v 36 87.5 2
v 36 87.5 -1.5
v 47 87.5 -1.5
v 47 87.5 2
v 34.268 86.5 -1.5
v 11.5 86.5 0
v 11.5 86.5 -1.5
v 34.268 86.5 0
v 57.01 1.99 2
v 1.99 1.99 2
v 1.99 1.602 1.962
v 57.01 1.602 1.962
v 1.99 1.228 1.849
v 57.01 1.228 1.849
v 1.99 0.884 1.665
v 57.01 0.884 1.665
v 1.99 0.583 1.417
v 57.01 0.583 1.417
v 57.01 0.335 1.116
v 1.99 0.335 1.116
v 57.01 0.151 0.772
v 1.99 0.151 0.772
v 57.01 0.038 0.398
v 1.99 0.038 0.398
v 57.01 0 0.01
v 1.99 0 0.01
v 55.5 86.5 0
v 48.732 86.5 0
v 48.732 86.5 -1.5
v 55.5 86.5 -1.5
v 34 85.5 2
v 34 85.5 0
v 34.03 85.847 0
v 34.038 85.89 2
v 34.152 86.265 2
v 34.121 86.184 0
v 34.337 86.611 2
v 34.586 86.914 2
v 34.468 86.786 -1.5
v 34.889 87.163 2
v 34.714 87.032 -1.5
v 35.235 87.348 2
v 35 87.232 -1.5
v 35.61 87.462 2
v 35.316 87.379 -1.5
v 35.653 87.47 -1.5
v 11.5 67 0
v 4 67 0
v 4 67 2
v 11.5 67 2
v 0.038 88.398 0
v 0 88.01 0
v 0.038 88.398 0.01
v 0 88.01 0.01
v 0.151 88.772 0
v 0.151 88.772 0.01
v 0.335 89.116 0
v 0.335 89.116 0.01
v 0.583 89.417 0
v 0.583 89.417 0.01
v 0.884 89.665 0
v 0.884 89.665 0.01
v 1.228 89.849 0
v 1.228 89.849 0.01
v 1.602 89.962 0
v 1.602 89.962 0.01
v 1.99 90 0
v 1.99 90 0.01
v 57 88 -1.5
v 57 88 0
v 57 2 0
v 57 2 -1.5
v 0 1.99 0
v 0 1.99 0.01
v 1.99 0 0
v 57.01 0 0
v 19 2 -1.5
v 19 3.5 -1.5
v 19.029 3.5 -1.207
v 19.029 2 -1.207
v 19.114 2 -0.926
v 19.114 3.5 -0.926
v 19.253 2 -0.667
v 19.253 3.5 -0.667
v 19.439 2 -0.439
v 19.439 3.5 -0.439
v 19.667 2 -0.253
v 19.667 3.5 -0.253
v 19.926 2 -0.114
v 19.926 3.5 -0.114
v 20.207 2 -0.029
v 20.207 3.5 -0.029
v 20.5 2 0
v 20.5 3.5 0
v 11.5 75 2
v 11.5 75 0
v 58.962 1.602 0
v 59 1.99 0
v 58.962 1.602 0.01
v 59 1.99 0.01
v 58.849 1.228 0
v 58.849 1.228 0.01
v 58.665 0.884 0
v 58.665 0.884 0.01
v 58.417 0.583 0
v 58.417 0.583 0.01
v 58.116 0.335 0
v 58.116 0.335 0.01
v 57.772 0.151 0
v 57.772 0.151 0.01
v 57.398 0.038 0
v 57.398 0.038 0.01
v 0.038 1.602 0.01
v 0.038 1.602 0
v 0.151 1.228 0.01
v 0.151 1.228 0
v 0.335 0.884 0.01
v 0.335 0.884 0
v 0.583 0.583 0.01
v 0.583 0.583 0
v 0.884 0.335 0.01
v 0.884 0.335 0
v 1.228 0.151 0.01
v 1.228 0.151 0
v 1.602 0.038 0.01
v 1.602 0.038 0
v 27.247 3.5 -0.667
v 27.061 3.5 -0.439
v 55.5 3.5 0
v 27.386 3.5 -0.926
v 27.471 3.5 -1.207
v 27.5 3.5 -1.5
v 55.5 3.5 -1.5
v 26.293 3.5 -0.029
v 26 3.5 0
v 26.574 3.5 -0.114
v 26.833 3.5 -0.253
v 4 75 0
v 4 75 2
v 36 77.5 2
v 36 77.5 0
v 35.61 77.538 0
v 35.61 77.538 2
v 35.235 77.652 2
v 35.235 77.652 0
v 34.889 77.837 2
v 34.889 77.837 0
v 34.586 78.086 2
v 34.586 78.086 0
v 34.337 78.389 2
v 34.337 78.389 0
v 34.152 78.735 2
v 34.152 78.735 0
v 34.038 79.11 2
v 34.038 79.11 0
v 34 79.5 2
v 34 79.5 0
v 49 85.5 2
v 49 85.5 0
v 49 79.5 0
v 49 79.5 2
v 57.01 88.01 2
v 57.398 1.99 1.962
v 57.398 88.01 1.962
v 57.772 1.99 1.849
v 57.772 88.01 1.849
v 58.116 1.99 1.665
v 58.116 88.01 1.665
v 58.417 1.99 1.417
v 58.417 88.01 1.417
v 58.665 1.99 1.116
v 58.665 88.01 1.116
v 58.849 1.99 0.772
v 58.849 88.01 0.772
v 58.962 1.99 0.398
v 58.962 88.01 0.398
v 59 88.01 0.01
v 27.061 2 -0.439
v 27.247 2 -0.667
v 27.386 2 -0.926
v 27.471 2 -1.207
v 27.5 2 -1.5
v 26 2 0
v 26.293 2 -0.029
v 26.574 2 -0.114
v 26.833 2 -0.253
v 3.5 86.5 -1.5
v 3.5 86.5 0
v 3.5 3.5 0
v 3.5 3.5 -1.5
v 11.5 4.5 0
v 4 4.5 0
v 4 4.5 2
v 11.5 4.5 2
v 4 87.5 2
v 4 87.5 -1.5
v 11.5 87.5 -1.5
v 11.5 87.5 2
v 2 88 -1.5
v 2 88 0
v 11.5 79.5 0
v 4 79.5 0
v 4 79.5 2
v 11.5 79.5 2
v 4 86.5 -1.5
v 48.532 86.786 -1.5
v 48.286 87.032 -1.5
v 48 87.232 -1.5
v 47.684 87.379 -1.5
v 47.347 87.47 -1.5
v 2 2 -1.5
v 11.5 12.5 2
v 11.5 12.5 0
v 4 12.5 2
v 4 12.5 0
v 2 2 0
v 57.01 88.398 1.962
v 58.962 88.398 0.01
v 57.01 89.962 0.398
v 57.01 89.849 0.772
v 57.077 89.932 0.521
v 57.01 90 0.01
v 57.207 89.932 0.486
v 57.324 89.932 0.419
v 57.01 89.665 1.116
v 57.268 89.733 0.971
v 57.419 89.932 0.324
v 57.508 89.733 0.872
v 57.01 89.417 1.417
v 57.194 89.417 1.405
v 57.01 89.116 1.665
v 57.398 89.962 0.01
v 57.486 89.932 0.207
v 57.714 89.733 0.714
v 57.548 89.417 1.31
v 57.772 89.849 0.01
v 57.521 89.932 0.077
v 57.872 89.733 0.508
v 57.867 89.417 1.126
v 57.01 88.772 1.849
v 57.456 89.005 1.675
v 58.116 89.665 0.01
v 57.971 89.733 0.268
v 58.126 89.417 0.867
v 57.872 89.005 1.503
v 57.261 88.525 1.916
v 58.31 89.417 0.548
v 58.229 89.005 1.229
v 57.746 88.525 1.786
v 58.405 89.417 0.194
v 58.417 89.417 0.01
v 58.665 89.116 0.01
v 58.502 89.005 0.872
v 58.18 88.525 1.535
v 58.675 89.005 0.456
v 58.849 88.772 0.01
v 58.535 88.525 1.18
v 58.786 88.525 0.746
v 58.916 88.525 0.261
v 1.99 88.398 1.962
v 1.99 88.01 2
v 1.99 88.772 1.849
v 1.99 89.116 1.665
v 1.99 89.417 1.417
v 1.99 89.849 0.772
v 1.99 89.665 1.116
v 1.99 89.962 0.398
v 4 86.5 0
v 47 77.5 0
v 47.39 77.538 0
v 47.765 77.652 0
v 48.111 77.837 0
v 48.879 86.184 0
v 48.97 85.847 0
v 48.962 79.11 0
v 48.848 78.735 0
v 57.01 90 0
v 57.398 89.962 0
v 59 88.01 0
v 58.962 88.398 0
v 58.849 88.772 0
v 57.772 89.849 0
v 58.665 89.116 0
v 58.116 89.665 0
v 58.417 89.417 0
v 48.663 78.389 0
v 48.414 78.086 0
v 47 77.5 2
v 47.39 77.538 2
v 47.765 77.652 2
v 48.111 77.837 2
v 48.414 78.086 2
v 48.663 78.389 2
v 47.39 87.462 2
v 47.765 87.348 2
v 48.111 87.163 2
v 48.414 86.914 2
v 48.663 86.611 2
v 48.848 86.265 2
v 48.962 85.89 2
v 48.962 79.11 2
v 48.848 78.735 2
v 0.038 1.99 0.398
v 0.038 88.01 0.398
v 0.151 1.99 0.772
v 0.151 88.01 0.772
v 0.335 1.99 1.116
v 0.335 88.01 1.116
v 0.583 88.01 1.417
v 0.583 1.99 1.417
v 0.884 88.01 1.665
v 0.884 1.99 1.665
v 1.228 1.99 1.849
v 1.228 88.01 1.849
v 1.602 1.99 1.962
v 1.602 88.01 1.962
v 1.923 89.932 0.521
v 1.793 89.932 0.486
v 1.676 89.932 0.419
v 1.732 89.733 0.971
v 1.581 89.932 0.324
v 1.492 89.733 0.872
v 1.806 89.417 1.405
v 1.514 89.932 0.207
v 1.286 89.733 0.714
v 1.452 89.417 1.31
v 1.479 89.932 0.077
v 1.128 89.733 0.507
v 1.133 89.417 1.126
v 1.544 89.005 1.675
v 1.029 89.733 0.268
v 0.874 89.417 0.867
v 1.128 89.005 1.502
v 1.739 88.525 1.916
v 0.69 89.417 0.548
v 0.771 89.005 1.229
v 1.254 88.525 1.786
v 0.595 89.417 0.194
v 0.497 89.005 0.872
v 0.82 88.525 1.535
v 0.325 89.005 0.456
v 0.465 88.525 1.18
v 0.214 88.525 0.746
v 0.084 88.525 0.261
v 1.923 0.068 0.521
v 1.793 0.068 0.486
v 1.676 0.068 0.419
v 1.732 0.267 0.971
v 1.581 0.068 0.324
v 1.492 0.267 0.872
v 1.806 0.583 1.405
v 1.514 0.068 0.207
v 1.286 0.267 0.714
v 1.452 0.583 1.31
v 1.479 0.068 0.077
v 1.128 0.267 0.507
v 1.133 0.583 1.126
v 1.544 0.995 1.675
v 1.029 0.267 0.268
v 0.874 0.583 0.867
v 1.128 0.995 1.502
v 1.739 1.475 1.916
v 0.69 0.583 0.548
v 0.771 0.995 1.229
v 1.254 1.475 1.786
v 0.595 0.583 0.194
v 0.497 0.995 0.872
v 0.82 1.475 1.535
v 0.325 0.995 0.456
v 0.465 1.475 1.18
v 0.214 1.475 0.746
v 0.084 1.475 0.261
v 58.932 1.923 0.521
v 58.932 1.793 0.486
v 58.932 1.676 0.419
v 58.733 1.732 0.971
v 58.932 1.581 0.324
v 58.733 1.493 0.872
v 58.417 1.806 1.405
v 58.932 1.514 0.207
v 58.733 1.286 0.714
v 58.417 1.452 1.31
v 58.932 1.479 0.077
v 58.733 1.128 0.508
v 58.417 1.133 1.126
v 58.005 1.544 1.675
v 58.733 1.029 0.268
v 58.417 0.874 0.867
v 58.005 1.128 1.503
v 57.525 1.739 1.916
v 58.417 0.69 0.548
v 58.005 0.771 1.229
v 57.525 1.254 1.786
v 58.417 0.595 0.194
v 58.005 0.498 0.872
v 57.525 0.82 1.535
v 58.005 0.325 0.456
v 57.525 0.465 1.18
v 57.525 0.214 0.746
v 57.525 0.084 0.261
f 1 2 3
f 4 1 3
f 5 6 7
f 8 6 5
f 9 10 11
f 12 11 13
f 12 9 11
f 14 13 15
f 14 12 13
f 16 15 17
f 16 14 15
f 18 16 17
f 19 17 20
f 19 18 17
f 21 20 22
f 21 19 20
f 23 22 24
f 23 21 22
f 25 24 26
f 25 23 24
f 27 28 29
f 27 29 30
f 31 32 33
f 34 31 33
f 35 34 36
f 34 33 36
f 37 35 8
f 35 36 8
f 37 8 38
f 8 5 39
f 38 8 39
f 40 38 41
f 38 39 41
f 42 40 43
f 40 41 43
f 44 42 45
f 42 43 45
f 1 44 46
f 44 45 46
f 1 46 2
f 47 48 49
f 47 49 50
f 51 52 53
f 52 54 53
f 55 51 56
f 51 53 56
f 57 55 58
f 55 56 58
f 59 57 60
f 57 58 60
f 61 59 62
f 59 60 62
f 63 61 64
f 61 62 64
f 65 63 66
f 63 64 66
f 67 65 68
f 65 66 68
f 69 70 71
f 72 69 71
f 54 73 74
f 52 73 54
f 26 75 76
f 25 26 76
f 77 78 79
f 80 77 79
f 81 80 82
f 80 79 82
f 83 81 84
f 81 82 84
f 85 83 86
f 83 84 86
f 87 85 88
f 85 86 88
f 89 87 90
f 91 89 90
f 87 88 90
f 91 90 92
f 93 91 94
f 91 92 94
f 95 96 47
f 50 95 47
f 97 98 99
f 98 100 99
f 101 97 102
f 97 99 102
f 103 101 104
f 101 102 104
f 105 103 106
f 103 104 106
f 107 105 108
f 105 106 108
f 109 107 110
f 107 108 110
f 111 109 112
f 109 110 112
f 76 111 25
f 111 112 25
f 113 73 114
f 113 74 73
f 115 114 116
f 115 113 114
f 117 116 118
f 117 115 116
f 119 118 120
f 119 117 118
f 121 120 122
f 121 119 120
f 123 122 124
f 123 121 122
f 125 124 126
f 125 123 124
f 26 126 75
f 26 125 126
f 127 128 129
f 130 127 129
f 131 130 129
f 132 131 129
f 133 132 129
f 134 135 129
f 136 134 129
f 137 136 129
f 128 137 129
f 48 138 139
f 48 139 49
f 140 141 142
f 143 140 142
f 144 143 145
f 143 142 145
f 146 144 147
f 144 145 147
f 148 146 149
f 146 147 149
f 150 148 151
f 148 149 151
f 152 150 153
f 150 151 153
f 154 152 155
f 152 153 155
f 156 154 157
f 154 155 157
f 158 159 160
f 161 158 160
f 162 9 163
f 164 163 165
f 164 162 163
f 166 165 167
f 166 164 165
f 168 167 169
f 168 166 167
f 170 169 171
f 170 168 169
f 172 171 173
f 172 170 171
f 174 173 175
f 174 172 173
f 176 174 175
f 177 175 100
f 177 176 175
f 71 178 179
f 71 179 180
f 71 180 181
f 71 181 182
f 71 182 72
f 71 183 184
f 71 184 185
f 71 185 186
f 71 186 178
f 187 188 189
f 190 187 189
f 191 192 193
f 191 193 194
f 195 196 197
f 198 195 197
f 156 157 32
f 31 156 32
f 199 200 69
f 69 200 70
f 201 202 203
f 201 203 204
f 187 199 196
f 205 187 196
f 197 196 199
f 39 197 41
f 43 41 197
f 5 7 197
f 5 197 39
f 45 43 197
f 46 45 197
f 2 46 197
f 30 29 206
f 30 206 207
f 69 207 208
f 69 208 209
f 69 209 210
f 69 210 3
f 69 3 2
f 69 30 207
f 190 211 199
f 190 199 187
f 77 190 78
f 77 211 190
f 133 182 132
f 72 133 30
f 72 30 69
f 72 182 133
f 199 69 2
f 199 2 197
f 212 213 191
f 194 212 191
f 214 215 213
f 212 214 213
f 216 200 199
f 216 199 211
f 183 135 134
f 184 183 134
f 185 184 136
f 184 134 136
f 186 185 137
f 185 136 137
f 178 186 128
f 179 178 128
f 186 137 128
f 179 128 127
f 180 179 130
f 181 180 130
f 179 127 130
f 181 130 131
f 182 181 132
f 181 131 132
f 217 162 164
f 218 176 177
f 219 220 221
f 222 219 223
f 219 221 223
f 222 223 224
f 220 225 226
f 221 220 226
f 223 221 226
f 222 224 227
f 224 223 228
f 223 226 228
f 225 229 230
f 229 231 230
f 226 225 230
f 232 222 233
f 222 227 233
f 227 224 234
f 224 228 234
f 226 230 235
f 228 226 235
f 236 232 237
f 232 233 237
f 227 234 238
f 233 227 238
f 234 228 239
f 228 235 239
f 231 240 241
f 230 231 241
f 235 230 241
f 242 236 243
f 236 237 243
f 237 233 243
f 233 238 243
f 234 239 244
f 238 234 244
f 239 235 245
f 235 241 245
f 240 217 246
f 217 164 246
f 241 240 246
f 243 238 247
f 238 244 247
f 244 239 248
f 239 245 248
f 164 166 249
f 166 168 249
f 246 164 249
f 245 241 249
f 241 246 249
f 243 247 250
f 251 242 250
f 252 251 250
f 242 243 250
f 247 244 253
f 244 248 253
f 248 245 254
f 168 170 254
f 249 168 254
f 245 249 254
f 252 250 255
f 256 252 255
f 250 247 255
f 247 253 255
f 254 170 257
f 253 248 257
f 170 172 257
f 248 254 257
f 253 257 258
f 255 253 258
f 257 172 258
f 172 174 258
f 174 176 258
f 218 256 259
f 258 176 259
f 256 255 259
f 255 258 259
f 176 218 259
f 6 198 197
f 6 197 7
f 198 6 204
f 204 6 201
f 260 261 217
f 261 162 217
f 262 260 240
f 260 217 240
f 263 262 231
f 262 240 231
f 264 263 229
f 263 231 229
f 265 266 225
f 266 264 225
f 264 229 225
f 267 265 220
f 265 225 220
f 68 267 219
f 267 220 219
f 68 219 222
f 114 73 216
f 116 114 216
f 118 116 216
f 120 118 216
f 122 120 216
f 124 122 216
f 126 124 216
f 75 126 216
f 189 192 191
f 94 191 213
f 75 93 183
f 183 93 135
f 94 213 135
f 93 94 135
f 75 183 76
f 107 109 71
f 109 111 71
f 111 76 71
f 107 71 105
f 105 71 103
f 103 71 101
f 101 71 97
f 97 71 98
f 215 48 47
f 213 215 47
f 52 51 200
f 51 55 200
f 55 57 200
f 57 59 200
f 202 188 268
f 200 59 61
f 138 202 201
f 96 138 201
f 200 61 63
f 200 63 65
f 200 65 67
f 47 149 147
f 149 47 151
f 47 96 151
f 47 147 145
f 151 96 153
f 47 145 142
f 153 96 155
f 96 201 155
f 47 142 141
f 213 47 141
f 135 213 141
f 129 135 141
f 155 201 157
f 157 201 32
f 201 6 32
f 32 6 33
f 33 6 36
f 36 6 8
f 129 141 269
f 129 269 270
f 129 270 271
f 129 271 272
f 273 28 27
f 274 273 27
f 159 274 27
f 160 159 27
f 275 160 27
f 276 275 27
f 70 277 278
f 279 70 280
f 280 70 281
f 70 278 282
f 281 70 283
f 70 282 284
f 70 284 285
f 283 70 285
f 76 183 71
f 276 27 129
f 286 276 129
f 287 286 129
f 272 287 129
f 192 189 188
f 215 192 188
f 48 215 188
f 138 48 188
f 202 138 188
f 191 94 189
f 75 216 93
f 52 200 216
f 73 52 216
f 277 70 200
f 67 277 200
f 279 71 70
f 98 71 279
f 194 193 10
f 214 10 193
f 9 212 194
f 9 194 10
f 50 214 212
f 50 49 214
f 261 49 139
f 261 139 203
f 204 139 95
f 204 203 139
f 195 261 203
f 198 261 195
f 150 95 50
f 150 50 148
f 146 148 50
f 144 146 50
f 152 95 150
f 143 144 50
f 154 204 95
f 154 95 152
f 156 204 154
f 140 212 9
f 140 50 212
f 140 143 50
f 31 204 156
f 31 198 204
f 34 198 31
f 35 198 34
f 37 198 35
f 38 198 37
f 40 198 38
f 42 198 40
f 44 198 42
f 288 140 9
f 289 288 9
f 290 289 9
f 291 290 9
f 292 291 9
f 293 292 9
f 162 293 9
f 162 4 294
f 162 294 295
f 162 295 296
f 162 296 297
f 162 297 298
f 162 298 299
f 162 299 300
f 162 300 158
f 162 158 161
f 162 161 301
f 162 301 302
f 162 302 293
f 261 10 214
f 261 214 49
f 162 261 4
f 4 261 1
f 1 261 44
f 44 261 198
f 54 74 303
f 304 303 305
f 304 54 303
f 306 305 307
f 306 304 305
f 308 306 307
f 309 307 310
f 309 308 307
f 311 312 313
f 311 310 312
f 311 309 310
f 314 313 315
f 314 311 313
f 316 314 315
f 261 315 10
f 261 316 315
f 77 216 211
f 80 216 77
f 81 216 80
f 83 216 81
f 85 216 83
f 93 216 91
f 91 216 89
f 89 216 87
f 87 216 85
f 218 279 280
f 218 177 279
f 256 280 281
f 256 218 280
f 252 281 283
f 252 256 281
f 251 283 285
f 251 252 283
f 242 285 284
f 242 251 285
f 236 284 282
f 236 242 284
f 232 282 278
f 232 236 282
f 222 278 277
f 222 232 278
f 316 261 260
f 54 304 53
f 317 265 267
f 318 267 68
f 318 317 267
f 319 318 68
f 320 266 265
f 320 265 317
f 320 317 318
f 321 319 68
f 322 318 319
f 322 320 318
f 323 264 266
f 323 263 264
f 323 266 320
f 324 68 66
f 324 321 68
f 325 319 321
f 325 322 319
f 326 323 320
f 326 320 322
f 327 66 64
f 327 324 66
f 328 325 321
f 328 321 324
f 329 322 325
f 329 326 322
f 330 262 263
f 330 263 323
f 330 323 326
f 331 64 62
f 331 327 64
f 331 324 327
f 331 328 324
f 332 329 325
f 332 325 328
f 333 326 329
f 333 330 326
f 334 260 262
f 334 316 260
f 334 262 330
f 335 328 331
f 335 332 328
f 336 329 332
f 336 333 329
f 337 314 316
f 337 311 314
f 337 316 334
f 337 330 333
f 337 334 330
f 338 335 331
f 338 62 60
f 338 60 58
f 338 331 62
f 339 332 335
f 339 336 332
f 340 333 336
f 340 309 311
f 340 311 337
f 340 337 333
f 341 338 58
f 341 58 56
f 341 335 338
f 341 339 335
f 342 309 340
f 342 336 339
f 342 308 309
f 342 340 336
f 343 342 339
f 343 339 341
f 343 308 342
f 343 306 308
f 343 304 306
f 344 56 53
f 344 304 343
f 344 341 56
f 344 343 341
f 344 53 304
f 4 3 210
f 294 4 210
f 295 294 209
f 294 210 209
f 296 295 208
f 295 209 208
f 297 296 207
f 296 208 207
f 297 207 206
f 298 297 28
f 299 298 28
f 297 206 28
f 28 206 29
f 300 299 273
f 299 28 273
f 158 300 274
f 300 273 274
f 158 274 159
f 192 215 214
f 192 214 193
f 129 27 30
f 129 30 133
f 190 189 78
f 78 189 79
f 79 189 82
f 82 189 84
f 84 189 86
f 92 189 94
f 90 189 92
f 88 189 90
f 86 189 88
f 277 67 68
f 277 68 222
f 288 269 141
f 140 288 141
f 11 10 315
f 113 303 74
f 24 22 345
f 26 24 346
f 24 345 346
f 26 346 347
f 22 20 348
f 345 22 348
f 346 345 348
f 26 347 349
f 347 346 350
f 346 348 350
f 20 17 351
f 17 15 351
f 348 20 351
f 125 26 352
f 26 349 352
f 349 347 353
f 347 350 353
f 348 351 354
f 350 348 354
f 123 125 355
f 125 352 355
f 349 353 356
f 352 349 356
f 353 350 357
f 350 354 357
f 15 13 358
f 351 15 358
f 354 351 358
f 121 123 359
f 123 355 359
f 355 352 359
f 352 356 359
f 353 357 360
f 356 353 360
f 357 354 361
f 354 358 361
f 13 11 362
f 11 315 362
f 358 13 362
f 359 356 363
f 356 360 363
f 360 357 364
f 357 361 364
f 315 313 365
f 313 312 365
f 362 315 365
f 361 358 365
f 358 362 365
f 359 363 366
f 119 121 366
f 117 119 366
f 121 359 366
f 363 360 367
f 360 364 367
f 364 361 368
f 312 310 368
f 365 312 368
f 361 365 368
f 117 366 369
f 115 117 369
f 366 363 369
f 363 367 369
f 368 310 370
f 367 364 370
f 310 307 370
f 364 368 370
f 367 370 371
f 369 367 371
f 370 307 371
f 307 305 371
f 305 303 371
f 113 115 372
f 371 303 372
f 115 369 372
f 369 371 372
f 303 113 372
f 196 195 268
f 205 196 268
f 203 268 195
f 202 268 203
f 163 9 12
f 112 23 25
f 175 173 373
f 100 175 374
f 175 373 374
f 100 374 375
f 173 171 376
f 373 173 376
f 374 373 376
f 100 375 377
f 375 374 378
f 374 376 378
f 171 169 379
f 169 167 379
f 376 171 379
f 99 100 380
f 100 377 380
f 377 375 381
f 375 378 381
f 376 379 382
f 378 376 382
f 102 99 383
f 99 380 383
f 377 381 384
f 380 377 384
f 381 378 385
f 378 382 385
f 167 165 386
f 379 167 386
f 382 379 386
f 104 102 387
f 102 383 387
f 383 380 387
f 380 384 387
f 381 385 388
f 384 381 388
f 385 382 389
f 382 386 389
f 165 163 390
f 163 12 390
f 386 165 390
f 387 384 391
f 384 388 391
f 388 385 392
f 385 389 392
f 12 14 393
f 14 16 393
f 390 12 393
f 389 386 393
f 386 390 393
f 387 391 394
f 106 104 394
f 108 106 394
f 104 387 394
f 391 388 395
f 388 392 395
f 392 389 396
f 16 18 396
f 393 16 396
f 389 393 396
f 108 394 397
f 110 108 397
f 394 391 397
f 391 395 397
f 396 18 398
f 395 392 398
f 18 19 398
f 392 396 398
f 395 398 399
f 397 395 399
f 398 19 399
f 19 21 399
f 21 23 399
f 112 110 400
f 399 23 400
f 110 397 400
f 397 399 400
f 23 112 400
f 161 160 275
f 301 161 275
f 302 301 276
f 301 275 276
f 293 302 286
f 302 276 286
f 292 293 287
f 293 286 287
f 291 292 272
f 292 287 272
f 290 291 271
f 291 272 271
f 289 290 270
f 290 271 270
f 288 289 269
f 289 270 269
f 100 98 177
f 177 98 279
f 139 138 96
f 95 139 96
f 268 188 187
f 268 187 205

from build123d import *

# Parameters (mm, degrees)
BOX001_W             = 59
BOX001_H             = 90
BOX001_DEPTH         = 2
SKETCH003_W          = 55
SKETCH003_H          = 86
SKETCH003_W_2        = 52
SKETCH003_H_2        = 83
PAD_DEPTH            = 1.5
SKETCH002_W          = 7.5
SKETCH002_H          = 8
POCKET002_DEPTH      = 2.001
POCKET002_DEPTH_BACK = 1.501
FILLET001_R          = 1.99
POCKET003_DEPTH      = 3.501


with BuildPart() as part:
    # Box001 → Box001 (join)
    with BuildSketch(Plane.XY):
        with Locations((29.5, 45)):
            Rectangle(BOX001_W, BOX001_H)
    extrude(amount=BOX001_DEPTH)

    # Sketch003 (on Face5 of Box001) → Pad (join)
    with BuildSketch(Plane(origin=(0, 0, 0), x_dir=(1, 0, 0), z_dir=(0, 0, -1))):
        with Locations((29.5, -45)):
            Rectangle(SKETCH003_W, SKETCH003_H)
        with Locations((29.5, -45)):
            Rectangle(SKETCH003_W_2, SKETCH003_H_2, mode=Mode.SUBTRACT)
    extrude(amount=PAD_DEPTH)

    # Sketch002 (on Face5 of Box001) → Pocket002 (cut, two sides)
    with BuildSketch(Plane(origin=(0, 0, 0), x_dir=(1, 0, 0), z_dir=(0, 0, -1))) as pocket002_sk:
        with Locations((7.75, -8.5)):
            Rectangle(SKETCH002_W, SKETCH002_H)
        with Locations((7.75, -71)):
            Rectangle(SKETCH002_W, SKETCH002_H)
        with Locations((7.75, -83.5)):
            Rectangle(SKETCH002_W, SKETCH002_H)
        with BuildLine():
            Line((34, -79.5), (34, -85.5))
            ThreePointArc((34, -85.5), (34.585786, -86.914214), (36, -87.5))
            Line((36, -87.5), (47, -87.5))
            ThreePointArc((47, -87.5), (48.414214, -86.914214), (49, -85.5))
            Line((49, -85.5), (49, -79.5))
            ThreePointArc((49, -79.5), (48.414214, -78.085786), (47, -77.5))
            Line((47, -77.5), (36, -77.5))
            ThreePointArc((36, -77.5), (34.585786, -78.085786), (34, -79.5))
        make_face()
    extrude(amount=-POCKET002_DEPTH, mode=Mode.SUBTRACT)
    extrude(pocket002_sk.sketch, amount=POCKET002_DEPTH_BACK, mode=Mode.SUBTRACT)

    # Fillet001
    fillet001_edges = [part.edges().sort_by_distance(p)[0] for p in [
        (0, 45, 2),
        (29.5, 0, 2),
        (59, 45, 2),
        (29.5, 90, 2),
        (59, 0, 1),
        (0, 0, 1),
        (59, 90, 1),
        (0, 90, 1),
    ]]
    fillet(fillet001_edges, radius=FILLET001_R)

    # Sketch005 (on Face14 of Pad) → Pocket003 (cut, through all)
    with BuildSketch(Plane(origin=(0, 3.5, 0), x_dir=(-1, 0, 0), z_dir=(0, 1, 0))):
        with BuildLine():
            ThreePointArc((-26, 0), (-27.06066, -0.43934), (-27.5, -1.5))
            Line((-27.5, -1.5), (-19, -1.5))
            ThreePointArc((-19, -1.5), (-19.43934, -0.43934), (-20.5, 0))
            Line((-26, 0), (-20.5, 0))
        make_face()
    extrude(amount=-POCKET003_DEPTH, mode=Mode.SUBTRACT)


solid = part.part
